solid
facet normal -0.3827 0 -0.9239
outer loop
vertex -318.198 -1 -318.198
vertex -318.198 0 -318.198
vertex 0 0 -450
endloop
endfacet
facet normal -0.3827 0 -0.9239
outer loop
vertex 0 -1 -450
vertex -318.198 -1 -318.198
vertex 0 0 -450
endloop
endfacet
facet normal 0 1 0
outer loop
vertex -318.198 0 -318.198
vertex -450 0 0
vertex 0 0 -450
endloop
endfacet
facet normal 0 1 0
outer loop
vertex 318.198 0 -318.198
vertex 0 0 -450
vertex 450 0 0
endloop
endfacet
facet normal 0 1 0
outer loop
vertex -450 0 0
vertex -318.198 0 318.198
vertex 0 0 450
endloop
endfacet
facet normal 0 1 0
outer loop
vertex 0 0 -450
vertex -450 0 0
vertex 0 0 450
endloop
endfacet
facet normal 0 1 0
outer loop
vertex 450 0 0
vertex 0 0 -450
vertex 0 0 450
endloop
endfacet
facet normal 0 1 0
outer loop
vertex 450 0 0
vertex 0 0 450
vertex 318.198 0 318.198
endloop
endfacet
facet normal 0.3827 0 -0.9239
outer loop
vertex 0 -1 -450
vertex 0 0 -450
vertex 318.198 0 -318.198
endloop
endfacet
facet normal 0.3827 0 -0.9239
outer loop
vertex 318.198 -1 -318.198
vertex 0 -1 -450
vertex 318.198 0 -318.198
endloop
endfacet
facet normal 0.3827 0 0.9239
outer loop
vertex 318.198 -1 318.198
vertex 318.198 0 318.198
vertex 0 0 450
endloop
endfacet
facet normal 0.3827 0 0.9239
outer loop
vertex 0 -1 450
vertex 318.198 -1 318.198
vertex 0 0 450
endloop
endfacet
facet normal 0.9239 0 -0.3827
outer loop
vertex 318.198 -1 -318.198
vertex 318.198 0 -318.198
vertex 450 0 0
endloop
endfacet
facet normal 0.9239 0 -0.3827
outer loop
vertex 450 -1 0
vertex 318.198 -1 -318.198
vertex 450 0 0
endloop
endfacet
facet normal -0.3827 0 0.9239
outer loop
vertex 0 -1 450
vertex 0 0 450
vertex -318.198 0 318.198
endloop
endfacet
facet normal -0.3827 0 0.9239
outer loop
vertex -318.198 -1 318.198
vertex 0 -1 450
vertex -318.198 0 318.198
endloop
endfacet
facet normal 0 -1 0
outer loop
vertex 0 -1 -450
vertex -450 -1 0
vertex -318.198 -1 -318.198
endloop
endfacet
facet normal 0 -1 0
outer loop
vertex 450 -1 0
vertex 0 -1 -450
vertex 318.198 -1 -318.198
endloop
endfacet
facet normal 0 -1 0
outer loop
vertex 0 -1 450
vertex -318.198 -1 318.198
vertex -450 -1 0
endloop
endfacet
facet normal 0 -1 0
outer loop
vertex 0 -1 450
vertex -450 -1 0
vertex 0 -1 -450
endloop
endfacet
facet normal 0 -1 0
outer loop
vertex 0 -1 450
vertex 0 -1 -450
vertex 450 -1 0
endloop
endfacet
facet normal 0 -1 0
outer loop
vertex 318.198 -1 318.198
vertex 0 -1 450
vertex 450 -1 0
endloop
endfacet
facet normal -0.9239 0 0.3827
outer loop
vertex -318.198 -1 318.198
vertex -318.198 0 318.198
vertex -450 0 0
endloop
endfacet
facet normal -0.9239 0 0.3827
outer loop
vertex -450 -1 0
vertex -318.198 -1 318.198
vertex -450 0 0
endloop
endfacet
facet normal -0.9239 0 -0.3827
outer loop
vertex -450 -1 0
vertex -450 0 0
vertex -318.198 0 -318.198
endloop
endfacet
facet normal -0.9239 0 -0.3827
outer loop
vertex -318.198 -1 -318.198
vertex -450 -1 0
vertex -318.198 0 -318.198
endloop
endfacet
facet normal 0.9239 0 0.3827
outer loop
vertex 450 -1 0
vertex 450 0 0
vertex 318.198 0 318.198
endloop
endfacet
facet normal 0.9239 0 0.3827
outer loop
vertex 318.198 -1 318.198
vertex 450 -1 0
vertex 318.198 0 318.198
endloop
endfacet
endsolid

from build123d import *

# Parameters (mm, degrees)
PAD_DEPTH = 1


with BuildPart() as part:
    # Sketch → Pad (new body)
    with BuildSketch(Plane.XZ):
        Polygon((450, 0), (318.198052, 318.198052), (0, 450), (-318.198052, 318.198052), (-450, 0), (-318.198052, -318.198052), (0, -450), (318.198052, -318.198052), align=None)
    extrude(amount=PAD_DEPTH)


solid = part.part
